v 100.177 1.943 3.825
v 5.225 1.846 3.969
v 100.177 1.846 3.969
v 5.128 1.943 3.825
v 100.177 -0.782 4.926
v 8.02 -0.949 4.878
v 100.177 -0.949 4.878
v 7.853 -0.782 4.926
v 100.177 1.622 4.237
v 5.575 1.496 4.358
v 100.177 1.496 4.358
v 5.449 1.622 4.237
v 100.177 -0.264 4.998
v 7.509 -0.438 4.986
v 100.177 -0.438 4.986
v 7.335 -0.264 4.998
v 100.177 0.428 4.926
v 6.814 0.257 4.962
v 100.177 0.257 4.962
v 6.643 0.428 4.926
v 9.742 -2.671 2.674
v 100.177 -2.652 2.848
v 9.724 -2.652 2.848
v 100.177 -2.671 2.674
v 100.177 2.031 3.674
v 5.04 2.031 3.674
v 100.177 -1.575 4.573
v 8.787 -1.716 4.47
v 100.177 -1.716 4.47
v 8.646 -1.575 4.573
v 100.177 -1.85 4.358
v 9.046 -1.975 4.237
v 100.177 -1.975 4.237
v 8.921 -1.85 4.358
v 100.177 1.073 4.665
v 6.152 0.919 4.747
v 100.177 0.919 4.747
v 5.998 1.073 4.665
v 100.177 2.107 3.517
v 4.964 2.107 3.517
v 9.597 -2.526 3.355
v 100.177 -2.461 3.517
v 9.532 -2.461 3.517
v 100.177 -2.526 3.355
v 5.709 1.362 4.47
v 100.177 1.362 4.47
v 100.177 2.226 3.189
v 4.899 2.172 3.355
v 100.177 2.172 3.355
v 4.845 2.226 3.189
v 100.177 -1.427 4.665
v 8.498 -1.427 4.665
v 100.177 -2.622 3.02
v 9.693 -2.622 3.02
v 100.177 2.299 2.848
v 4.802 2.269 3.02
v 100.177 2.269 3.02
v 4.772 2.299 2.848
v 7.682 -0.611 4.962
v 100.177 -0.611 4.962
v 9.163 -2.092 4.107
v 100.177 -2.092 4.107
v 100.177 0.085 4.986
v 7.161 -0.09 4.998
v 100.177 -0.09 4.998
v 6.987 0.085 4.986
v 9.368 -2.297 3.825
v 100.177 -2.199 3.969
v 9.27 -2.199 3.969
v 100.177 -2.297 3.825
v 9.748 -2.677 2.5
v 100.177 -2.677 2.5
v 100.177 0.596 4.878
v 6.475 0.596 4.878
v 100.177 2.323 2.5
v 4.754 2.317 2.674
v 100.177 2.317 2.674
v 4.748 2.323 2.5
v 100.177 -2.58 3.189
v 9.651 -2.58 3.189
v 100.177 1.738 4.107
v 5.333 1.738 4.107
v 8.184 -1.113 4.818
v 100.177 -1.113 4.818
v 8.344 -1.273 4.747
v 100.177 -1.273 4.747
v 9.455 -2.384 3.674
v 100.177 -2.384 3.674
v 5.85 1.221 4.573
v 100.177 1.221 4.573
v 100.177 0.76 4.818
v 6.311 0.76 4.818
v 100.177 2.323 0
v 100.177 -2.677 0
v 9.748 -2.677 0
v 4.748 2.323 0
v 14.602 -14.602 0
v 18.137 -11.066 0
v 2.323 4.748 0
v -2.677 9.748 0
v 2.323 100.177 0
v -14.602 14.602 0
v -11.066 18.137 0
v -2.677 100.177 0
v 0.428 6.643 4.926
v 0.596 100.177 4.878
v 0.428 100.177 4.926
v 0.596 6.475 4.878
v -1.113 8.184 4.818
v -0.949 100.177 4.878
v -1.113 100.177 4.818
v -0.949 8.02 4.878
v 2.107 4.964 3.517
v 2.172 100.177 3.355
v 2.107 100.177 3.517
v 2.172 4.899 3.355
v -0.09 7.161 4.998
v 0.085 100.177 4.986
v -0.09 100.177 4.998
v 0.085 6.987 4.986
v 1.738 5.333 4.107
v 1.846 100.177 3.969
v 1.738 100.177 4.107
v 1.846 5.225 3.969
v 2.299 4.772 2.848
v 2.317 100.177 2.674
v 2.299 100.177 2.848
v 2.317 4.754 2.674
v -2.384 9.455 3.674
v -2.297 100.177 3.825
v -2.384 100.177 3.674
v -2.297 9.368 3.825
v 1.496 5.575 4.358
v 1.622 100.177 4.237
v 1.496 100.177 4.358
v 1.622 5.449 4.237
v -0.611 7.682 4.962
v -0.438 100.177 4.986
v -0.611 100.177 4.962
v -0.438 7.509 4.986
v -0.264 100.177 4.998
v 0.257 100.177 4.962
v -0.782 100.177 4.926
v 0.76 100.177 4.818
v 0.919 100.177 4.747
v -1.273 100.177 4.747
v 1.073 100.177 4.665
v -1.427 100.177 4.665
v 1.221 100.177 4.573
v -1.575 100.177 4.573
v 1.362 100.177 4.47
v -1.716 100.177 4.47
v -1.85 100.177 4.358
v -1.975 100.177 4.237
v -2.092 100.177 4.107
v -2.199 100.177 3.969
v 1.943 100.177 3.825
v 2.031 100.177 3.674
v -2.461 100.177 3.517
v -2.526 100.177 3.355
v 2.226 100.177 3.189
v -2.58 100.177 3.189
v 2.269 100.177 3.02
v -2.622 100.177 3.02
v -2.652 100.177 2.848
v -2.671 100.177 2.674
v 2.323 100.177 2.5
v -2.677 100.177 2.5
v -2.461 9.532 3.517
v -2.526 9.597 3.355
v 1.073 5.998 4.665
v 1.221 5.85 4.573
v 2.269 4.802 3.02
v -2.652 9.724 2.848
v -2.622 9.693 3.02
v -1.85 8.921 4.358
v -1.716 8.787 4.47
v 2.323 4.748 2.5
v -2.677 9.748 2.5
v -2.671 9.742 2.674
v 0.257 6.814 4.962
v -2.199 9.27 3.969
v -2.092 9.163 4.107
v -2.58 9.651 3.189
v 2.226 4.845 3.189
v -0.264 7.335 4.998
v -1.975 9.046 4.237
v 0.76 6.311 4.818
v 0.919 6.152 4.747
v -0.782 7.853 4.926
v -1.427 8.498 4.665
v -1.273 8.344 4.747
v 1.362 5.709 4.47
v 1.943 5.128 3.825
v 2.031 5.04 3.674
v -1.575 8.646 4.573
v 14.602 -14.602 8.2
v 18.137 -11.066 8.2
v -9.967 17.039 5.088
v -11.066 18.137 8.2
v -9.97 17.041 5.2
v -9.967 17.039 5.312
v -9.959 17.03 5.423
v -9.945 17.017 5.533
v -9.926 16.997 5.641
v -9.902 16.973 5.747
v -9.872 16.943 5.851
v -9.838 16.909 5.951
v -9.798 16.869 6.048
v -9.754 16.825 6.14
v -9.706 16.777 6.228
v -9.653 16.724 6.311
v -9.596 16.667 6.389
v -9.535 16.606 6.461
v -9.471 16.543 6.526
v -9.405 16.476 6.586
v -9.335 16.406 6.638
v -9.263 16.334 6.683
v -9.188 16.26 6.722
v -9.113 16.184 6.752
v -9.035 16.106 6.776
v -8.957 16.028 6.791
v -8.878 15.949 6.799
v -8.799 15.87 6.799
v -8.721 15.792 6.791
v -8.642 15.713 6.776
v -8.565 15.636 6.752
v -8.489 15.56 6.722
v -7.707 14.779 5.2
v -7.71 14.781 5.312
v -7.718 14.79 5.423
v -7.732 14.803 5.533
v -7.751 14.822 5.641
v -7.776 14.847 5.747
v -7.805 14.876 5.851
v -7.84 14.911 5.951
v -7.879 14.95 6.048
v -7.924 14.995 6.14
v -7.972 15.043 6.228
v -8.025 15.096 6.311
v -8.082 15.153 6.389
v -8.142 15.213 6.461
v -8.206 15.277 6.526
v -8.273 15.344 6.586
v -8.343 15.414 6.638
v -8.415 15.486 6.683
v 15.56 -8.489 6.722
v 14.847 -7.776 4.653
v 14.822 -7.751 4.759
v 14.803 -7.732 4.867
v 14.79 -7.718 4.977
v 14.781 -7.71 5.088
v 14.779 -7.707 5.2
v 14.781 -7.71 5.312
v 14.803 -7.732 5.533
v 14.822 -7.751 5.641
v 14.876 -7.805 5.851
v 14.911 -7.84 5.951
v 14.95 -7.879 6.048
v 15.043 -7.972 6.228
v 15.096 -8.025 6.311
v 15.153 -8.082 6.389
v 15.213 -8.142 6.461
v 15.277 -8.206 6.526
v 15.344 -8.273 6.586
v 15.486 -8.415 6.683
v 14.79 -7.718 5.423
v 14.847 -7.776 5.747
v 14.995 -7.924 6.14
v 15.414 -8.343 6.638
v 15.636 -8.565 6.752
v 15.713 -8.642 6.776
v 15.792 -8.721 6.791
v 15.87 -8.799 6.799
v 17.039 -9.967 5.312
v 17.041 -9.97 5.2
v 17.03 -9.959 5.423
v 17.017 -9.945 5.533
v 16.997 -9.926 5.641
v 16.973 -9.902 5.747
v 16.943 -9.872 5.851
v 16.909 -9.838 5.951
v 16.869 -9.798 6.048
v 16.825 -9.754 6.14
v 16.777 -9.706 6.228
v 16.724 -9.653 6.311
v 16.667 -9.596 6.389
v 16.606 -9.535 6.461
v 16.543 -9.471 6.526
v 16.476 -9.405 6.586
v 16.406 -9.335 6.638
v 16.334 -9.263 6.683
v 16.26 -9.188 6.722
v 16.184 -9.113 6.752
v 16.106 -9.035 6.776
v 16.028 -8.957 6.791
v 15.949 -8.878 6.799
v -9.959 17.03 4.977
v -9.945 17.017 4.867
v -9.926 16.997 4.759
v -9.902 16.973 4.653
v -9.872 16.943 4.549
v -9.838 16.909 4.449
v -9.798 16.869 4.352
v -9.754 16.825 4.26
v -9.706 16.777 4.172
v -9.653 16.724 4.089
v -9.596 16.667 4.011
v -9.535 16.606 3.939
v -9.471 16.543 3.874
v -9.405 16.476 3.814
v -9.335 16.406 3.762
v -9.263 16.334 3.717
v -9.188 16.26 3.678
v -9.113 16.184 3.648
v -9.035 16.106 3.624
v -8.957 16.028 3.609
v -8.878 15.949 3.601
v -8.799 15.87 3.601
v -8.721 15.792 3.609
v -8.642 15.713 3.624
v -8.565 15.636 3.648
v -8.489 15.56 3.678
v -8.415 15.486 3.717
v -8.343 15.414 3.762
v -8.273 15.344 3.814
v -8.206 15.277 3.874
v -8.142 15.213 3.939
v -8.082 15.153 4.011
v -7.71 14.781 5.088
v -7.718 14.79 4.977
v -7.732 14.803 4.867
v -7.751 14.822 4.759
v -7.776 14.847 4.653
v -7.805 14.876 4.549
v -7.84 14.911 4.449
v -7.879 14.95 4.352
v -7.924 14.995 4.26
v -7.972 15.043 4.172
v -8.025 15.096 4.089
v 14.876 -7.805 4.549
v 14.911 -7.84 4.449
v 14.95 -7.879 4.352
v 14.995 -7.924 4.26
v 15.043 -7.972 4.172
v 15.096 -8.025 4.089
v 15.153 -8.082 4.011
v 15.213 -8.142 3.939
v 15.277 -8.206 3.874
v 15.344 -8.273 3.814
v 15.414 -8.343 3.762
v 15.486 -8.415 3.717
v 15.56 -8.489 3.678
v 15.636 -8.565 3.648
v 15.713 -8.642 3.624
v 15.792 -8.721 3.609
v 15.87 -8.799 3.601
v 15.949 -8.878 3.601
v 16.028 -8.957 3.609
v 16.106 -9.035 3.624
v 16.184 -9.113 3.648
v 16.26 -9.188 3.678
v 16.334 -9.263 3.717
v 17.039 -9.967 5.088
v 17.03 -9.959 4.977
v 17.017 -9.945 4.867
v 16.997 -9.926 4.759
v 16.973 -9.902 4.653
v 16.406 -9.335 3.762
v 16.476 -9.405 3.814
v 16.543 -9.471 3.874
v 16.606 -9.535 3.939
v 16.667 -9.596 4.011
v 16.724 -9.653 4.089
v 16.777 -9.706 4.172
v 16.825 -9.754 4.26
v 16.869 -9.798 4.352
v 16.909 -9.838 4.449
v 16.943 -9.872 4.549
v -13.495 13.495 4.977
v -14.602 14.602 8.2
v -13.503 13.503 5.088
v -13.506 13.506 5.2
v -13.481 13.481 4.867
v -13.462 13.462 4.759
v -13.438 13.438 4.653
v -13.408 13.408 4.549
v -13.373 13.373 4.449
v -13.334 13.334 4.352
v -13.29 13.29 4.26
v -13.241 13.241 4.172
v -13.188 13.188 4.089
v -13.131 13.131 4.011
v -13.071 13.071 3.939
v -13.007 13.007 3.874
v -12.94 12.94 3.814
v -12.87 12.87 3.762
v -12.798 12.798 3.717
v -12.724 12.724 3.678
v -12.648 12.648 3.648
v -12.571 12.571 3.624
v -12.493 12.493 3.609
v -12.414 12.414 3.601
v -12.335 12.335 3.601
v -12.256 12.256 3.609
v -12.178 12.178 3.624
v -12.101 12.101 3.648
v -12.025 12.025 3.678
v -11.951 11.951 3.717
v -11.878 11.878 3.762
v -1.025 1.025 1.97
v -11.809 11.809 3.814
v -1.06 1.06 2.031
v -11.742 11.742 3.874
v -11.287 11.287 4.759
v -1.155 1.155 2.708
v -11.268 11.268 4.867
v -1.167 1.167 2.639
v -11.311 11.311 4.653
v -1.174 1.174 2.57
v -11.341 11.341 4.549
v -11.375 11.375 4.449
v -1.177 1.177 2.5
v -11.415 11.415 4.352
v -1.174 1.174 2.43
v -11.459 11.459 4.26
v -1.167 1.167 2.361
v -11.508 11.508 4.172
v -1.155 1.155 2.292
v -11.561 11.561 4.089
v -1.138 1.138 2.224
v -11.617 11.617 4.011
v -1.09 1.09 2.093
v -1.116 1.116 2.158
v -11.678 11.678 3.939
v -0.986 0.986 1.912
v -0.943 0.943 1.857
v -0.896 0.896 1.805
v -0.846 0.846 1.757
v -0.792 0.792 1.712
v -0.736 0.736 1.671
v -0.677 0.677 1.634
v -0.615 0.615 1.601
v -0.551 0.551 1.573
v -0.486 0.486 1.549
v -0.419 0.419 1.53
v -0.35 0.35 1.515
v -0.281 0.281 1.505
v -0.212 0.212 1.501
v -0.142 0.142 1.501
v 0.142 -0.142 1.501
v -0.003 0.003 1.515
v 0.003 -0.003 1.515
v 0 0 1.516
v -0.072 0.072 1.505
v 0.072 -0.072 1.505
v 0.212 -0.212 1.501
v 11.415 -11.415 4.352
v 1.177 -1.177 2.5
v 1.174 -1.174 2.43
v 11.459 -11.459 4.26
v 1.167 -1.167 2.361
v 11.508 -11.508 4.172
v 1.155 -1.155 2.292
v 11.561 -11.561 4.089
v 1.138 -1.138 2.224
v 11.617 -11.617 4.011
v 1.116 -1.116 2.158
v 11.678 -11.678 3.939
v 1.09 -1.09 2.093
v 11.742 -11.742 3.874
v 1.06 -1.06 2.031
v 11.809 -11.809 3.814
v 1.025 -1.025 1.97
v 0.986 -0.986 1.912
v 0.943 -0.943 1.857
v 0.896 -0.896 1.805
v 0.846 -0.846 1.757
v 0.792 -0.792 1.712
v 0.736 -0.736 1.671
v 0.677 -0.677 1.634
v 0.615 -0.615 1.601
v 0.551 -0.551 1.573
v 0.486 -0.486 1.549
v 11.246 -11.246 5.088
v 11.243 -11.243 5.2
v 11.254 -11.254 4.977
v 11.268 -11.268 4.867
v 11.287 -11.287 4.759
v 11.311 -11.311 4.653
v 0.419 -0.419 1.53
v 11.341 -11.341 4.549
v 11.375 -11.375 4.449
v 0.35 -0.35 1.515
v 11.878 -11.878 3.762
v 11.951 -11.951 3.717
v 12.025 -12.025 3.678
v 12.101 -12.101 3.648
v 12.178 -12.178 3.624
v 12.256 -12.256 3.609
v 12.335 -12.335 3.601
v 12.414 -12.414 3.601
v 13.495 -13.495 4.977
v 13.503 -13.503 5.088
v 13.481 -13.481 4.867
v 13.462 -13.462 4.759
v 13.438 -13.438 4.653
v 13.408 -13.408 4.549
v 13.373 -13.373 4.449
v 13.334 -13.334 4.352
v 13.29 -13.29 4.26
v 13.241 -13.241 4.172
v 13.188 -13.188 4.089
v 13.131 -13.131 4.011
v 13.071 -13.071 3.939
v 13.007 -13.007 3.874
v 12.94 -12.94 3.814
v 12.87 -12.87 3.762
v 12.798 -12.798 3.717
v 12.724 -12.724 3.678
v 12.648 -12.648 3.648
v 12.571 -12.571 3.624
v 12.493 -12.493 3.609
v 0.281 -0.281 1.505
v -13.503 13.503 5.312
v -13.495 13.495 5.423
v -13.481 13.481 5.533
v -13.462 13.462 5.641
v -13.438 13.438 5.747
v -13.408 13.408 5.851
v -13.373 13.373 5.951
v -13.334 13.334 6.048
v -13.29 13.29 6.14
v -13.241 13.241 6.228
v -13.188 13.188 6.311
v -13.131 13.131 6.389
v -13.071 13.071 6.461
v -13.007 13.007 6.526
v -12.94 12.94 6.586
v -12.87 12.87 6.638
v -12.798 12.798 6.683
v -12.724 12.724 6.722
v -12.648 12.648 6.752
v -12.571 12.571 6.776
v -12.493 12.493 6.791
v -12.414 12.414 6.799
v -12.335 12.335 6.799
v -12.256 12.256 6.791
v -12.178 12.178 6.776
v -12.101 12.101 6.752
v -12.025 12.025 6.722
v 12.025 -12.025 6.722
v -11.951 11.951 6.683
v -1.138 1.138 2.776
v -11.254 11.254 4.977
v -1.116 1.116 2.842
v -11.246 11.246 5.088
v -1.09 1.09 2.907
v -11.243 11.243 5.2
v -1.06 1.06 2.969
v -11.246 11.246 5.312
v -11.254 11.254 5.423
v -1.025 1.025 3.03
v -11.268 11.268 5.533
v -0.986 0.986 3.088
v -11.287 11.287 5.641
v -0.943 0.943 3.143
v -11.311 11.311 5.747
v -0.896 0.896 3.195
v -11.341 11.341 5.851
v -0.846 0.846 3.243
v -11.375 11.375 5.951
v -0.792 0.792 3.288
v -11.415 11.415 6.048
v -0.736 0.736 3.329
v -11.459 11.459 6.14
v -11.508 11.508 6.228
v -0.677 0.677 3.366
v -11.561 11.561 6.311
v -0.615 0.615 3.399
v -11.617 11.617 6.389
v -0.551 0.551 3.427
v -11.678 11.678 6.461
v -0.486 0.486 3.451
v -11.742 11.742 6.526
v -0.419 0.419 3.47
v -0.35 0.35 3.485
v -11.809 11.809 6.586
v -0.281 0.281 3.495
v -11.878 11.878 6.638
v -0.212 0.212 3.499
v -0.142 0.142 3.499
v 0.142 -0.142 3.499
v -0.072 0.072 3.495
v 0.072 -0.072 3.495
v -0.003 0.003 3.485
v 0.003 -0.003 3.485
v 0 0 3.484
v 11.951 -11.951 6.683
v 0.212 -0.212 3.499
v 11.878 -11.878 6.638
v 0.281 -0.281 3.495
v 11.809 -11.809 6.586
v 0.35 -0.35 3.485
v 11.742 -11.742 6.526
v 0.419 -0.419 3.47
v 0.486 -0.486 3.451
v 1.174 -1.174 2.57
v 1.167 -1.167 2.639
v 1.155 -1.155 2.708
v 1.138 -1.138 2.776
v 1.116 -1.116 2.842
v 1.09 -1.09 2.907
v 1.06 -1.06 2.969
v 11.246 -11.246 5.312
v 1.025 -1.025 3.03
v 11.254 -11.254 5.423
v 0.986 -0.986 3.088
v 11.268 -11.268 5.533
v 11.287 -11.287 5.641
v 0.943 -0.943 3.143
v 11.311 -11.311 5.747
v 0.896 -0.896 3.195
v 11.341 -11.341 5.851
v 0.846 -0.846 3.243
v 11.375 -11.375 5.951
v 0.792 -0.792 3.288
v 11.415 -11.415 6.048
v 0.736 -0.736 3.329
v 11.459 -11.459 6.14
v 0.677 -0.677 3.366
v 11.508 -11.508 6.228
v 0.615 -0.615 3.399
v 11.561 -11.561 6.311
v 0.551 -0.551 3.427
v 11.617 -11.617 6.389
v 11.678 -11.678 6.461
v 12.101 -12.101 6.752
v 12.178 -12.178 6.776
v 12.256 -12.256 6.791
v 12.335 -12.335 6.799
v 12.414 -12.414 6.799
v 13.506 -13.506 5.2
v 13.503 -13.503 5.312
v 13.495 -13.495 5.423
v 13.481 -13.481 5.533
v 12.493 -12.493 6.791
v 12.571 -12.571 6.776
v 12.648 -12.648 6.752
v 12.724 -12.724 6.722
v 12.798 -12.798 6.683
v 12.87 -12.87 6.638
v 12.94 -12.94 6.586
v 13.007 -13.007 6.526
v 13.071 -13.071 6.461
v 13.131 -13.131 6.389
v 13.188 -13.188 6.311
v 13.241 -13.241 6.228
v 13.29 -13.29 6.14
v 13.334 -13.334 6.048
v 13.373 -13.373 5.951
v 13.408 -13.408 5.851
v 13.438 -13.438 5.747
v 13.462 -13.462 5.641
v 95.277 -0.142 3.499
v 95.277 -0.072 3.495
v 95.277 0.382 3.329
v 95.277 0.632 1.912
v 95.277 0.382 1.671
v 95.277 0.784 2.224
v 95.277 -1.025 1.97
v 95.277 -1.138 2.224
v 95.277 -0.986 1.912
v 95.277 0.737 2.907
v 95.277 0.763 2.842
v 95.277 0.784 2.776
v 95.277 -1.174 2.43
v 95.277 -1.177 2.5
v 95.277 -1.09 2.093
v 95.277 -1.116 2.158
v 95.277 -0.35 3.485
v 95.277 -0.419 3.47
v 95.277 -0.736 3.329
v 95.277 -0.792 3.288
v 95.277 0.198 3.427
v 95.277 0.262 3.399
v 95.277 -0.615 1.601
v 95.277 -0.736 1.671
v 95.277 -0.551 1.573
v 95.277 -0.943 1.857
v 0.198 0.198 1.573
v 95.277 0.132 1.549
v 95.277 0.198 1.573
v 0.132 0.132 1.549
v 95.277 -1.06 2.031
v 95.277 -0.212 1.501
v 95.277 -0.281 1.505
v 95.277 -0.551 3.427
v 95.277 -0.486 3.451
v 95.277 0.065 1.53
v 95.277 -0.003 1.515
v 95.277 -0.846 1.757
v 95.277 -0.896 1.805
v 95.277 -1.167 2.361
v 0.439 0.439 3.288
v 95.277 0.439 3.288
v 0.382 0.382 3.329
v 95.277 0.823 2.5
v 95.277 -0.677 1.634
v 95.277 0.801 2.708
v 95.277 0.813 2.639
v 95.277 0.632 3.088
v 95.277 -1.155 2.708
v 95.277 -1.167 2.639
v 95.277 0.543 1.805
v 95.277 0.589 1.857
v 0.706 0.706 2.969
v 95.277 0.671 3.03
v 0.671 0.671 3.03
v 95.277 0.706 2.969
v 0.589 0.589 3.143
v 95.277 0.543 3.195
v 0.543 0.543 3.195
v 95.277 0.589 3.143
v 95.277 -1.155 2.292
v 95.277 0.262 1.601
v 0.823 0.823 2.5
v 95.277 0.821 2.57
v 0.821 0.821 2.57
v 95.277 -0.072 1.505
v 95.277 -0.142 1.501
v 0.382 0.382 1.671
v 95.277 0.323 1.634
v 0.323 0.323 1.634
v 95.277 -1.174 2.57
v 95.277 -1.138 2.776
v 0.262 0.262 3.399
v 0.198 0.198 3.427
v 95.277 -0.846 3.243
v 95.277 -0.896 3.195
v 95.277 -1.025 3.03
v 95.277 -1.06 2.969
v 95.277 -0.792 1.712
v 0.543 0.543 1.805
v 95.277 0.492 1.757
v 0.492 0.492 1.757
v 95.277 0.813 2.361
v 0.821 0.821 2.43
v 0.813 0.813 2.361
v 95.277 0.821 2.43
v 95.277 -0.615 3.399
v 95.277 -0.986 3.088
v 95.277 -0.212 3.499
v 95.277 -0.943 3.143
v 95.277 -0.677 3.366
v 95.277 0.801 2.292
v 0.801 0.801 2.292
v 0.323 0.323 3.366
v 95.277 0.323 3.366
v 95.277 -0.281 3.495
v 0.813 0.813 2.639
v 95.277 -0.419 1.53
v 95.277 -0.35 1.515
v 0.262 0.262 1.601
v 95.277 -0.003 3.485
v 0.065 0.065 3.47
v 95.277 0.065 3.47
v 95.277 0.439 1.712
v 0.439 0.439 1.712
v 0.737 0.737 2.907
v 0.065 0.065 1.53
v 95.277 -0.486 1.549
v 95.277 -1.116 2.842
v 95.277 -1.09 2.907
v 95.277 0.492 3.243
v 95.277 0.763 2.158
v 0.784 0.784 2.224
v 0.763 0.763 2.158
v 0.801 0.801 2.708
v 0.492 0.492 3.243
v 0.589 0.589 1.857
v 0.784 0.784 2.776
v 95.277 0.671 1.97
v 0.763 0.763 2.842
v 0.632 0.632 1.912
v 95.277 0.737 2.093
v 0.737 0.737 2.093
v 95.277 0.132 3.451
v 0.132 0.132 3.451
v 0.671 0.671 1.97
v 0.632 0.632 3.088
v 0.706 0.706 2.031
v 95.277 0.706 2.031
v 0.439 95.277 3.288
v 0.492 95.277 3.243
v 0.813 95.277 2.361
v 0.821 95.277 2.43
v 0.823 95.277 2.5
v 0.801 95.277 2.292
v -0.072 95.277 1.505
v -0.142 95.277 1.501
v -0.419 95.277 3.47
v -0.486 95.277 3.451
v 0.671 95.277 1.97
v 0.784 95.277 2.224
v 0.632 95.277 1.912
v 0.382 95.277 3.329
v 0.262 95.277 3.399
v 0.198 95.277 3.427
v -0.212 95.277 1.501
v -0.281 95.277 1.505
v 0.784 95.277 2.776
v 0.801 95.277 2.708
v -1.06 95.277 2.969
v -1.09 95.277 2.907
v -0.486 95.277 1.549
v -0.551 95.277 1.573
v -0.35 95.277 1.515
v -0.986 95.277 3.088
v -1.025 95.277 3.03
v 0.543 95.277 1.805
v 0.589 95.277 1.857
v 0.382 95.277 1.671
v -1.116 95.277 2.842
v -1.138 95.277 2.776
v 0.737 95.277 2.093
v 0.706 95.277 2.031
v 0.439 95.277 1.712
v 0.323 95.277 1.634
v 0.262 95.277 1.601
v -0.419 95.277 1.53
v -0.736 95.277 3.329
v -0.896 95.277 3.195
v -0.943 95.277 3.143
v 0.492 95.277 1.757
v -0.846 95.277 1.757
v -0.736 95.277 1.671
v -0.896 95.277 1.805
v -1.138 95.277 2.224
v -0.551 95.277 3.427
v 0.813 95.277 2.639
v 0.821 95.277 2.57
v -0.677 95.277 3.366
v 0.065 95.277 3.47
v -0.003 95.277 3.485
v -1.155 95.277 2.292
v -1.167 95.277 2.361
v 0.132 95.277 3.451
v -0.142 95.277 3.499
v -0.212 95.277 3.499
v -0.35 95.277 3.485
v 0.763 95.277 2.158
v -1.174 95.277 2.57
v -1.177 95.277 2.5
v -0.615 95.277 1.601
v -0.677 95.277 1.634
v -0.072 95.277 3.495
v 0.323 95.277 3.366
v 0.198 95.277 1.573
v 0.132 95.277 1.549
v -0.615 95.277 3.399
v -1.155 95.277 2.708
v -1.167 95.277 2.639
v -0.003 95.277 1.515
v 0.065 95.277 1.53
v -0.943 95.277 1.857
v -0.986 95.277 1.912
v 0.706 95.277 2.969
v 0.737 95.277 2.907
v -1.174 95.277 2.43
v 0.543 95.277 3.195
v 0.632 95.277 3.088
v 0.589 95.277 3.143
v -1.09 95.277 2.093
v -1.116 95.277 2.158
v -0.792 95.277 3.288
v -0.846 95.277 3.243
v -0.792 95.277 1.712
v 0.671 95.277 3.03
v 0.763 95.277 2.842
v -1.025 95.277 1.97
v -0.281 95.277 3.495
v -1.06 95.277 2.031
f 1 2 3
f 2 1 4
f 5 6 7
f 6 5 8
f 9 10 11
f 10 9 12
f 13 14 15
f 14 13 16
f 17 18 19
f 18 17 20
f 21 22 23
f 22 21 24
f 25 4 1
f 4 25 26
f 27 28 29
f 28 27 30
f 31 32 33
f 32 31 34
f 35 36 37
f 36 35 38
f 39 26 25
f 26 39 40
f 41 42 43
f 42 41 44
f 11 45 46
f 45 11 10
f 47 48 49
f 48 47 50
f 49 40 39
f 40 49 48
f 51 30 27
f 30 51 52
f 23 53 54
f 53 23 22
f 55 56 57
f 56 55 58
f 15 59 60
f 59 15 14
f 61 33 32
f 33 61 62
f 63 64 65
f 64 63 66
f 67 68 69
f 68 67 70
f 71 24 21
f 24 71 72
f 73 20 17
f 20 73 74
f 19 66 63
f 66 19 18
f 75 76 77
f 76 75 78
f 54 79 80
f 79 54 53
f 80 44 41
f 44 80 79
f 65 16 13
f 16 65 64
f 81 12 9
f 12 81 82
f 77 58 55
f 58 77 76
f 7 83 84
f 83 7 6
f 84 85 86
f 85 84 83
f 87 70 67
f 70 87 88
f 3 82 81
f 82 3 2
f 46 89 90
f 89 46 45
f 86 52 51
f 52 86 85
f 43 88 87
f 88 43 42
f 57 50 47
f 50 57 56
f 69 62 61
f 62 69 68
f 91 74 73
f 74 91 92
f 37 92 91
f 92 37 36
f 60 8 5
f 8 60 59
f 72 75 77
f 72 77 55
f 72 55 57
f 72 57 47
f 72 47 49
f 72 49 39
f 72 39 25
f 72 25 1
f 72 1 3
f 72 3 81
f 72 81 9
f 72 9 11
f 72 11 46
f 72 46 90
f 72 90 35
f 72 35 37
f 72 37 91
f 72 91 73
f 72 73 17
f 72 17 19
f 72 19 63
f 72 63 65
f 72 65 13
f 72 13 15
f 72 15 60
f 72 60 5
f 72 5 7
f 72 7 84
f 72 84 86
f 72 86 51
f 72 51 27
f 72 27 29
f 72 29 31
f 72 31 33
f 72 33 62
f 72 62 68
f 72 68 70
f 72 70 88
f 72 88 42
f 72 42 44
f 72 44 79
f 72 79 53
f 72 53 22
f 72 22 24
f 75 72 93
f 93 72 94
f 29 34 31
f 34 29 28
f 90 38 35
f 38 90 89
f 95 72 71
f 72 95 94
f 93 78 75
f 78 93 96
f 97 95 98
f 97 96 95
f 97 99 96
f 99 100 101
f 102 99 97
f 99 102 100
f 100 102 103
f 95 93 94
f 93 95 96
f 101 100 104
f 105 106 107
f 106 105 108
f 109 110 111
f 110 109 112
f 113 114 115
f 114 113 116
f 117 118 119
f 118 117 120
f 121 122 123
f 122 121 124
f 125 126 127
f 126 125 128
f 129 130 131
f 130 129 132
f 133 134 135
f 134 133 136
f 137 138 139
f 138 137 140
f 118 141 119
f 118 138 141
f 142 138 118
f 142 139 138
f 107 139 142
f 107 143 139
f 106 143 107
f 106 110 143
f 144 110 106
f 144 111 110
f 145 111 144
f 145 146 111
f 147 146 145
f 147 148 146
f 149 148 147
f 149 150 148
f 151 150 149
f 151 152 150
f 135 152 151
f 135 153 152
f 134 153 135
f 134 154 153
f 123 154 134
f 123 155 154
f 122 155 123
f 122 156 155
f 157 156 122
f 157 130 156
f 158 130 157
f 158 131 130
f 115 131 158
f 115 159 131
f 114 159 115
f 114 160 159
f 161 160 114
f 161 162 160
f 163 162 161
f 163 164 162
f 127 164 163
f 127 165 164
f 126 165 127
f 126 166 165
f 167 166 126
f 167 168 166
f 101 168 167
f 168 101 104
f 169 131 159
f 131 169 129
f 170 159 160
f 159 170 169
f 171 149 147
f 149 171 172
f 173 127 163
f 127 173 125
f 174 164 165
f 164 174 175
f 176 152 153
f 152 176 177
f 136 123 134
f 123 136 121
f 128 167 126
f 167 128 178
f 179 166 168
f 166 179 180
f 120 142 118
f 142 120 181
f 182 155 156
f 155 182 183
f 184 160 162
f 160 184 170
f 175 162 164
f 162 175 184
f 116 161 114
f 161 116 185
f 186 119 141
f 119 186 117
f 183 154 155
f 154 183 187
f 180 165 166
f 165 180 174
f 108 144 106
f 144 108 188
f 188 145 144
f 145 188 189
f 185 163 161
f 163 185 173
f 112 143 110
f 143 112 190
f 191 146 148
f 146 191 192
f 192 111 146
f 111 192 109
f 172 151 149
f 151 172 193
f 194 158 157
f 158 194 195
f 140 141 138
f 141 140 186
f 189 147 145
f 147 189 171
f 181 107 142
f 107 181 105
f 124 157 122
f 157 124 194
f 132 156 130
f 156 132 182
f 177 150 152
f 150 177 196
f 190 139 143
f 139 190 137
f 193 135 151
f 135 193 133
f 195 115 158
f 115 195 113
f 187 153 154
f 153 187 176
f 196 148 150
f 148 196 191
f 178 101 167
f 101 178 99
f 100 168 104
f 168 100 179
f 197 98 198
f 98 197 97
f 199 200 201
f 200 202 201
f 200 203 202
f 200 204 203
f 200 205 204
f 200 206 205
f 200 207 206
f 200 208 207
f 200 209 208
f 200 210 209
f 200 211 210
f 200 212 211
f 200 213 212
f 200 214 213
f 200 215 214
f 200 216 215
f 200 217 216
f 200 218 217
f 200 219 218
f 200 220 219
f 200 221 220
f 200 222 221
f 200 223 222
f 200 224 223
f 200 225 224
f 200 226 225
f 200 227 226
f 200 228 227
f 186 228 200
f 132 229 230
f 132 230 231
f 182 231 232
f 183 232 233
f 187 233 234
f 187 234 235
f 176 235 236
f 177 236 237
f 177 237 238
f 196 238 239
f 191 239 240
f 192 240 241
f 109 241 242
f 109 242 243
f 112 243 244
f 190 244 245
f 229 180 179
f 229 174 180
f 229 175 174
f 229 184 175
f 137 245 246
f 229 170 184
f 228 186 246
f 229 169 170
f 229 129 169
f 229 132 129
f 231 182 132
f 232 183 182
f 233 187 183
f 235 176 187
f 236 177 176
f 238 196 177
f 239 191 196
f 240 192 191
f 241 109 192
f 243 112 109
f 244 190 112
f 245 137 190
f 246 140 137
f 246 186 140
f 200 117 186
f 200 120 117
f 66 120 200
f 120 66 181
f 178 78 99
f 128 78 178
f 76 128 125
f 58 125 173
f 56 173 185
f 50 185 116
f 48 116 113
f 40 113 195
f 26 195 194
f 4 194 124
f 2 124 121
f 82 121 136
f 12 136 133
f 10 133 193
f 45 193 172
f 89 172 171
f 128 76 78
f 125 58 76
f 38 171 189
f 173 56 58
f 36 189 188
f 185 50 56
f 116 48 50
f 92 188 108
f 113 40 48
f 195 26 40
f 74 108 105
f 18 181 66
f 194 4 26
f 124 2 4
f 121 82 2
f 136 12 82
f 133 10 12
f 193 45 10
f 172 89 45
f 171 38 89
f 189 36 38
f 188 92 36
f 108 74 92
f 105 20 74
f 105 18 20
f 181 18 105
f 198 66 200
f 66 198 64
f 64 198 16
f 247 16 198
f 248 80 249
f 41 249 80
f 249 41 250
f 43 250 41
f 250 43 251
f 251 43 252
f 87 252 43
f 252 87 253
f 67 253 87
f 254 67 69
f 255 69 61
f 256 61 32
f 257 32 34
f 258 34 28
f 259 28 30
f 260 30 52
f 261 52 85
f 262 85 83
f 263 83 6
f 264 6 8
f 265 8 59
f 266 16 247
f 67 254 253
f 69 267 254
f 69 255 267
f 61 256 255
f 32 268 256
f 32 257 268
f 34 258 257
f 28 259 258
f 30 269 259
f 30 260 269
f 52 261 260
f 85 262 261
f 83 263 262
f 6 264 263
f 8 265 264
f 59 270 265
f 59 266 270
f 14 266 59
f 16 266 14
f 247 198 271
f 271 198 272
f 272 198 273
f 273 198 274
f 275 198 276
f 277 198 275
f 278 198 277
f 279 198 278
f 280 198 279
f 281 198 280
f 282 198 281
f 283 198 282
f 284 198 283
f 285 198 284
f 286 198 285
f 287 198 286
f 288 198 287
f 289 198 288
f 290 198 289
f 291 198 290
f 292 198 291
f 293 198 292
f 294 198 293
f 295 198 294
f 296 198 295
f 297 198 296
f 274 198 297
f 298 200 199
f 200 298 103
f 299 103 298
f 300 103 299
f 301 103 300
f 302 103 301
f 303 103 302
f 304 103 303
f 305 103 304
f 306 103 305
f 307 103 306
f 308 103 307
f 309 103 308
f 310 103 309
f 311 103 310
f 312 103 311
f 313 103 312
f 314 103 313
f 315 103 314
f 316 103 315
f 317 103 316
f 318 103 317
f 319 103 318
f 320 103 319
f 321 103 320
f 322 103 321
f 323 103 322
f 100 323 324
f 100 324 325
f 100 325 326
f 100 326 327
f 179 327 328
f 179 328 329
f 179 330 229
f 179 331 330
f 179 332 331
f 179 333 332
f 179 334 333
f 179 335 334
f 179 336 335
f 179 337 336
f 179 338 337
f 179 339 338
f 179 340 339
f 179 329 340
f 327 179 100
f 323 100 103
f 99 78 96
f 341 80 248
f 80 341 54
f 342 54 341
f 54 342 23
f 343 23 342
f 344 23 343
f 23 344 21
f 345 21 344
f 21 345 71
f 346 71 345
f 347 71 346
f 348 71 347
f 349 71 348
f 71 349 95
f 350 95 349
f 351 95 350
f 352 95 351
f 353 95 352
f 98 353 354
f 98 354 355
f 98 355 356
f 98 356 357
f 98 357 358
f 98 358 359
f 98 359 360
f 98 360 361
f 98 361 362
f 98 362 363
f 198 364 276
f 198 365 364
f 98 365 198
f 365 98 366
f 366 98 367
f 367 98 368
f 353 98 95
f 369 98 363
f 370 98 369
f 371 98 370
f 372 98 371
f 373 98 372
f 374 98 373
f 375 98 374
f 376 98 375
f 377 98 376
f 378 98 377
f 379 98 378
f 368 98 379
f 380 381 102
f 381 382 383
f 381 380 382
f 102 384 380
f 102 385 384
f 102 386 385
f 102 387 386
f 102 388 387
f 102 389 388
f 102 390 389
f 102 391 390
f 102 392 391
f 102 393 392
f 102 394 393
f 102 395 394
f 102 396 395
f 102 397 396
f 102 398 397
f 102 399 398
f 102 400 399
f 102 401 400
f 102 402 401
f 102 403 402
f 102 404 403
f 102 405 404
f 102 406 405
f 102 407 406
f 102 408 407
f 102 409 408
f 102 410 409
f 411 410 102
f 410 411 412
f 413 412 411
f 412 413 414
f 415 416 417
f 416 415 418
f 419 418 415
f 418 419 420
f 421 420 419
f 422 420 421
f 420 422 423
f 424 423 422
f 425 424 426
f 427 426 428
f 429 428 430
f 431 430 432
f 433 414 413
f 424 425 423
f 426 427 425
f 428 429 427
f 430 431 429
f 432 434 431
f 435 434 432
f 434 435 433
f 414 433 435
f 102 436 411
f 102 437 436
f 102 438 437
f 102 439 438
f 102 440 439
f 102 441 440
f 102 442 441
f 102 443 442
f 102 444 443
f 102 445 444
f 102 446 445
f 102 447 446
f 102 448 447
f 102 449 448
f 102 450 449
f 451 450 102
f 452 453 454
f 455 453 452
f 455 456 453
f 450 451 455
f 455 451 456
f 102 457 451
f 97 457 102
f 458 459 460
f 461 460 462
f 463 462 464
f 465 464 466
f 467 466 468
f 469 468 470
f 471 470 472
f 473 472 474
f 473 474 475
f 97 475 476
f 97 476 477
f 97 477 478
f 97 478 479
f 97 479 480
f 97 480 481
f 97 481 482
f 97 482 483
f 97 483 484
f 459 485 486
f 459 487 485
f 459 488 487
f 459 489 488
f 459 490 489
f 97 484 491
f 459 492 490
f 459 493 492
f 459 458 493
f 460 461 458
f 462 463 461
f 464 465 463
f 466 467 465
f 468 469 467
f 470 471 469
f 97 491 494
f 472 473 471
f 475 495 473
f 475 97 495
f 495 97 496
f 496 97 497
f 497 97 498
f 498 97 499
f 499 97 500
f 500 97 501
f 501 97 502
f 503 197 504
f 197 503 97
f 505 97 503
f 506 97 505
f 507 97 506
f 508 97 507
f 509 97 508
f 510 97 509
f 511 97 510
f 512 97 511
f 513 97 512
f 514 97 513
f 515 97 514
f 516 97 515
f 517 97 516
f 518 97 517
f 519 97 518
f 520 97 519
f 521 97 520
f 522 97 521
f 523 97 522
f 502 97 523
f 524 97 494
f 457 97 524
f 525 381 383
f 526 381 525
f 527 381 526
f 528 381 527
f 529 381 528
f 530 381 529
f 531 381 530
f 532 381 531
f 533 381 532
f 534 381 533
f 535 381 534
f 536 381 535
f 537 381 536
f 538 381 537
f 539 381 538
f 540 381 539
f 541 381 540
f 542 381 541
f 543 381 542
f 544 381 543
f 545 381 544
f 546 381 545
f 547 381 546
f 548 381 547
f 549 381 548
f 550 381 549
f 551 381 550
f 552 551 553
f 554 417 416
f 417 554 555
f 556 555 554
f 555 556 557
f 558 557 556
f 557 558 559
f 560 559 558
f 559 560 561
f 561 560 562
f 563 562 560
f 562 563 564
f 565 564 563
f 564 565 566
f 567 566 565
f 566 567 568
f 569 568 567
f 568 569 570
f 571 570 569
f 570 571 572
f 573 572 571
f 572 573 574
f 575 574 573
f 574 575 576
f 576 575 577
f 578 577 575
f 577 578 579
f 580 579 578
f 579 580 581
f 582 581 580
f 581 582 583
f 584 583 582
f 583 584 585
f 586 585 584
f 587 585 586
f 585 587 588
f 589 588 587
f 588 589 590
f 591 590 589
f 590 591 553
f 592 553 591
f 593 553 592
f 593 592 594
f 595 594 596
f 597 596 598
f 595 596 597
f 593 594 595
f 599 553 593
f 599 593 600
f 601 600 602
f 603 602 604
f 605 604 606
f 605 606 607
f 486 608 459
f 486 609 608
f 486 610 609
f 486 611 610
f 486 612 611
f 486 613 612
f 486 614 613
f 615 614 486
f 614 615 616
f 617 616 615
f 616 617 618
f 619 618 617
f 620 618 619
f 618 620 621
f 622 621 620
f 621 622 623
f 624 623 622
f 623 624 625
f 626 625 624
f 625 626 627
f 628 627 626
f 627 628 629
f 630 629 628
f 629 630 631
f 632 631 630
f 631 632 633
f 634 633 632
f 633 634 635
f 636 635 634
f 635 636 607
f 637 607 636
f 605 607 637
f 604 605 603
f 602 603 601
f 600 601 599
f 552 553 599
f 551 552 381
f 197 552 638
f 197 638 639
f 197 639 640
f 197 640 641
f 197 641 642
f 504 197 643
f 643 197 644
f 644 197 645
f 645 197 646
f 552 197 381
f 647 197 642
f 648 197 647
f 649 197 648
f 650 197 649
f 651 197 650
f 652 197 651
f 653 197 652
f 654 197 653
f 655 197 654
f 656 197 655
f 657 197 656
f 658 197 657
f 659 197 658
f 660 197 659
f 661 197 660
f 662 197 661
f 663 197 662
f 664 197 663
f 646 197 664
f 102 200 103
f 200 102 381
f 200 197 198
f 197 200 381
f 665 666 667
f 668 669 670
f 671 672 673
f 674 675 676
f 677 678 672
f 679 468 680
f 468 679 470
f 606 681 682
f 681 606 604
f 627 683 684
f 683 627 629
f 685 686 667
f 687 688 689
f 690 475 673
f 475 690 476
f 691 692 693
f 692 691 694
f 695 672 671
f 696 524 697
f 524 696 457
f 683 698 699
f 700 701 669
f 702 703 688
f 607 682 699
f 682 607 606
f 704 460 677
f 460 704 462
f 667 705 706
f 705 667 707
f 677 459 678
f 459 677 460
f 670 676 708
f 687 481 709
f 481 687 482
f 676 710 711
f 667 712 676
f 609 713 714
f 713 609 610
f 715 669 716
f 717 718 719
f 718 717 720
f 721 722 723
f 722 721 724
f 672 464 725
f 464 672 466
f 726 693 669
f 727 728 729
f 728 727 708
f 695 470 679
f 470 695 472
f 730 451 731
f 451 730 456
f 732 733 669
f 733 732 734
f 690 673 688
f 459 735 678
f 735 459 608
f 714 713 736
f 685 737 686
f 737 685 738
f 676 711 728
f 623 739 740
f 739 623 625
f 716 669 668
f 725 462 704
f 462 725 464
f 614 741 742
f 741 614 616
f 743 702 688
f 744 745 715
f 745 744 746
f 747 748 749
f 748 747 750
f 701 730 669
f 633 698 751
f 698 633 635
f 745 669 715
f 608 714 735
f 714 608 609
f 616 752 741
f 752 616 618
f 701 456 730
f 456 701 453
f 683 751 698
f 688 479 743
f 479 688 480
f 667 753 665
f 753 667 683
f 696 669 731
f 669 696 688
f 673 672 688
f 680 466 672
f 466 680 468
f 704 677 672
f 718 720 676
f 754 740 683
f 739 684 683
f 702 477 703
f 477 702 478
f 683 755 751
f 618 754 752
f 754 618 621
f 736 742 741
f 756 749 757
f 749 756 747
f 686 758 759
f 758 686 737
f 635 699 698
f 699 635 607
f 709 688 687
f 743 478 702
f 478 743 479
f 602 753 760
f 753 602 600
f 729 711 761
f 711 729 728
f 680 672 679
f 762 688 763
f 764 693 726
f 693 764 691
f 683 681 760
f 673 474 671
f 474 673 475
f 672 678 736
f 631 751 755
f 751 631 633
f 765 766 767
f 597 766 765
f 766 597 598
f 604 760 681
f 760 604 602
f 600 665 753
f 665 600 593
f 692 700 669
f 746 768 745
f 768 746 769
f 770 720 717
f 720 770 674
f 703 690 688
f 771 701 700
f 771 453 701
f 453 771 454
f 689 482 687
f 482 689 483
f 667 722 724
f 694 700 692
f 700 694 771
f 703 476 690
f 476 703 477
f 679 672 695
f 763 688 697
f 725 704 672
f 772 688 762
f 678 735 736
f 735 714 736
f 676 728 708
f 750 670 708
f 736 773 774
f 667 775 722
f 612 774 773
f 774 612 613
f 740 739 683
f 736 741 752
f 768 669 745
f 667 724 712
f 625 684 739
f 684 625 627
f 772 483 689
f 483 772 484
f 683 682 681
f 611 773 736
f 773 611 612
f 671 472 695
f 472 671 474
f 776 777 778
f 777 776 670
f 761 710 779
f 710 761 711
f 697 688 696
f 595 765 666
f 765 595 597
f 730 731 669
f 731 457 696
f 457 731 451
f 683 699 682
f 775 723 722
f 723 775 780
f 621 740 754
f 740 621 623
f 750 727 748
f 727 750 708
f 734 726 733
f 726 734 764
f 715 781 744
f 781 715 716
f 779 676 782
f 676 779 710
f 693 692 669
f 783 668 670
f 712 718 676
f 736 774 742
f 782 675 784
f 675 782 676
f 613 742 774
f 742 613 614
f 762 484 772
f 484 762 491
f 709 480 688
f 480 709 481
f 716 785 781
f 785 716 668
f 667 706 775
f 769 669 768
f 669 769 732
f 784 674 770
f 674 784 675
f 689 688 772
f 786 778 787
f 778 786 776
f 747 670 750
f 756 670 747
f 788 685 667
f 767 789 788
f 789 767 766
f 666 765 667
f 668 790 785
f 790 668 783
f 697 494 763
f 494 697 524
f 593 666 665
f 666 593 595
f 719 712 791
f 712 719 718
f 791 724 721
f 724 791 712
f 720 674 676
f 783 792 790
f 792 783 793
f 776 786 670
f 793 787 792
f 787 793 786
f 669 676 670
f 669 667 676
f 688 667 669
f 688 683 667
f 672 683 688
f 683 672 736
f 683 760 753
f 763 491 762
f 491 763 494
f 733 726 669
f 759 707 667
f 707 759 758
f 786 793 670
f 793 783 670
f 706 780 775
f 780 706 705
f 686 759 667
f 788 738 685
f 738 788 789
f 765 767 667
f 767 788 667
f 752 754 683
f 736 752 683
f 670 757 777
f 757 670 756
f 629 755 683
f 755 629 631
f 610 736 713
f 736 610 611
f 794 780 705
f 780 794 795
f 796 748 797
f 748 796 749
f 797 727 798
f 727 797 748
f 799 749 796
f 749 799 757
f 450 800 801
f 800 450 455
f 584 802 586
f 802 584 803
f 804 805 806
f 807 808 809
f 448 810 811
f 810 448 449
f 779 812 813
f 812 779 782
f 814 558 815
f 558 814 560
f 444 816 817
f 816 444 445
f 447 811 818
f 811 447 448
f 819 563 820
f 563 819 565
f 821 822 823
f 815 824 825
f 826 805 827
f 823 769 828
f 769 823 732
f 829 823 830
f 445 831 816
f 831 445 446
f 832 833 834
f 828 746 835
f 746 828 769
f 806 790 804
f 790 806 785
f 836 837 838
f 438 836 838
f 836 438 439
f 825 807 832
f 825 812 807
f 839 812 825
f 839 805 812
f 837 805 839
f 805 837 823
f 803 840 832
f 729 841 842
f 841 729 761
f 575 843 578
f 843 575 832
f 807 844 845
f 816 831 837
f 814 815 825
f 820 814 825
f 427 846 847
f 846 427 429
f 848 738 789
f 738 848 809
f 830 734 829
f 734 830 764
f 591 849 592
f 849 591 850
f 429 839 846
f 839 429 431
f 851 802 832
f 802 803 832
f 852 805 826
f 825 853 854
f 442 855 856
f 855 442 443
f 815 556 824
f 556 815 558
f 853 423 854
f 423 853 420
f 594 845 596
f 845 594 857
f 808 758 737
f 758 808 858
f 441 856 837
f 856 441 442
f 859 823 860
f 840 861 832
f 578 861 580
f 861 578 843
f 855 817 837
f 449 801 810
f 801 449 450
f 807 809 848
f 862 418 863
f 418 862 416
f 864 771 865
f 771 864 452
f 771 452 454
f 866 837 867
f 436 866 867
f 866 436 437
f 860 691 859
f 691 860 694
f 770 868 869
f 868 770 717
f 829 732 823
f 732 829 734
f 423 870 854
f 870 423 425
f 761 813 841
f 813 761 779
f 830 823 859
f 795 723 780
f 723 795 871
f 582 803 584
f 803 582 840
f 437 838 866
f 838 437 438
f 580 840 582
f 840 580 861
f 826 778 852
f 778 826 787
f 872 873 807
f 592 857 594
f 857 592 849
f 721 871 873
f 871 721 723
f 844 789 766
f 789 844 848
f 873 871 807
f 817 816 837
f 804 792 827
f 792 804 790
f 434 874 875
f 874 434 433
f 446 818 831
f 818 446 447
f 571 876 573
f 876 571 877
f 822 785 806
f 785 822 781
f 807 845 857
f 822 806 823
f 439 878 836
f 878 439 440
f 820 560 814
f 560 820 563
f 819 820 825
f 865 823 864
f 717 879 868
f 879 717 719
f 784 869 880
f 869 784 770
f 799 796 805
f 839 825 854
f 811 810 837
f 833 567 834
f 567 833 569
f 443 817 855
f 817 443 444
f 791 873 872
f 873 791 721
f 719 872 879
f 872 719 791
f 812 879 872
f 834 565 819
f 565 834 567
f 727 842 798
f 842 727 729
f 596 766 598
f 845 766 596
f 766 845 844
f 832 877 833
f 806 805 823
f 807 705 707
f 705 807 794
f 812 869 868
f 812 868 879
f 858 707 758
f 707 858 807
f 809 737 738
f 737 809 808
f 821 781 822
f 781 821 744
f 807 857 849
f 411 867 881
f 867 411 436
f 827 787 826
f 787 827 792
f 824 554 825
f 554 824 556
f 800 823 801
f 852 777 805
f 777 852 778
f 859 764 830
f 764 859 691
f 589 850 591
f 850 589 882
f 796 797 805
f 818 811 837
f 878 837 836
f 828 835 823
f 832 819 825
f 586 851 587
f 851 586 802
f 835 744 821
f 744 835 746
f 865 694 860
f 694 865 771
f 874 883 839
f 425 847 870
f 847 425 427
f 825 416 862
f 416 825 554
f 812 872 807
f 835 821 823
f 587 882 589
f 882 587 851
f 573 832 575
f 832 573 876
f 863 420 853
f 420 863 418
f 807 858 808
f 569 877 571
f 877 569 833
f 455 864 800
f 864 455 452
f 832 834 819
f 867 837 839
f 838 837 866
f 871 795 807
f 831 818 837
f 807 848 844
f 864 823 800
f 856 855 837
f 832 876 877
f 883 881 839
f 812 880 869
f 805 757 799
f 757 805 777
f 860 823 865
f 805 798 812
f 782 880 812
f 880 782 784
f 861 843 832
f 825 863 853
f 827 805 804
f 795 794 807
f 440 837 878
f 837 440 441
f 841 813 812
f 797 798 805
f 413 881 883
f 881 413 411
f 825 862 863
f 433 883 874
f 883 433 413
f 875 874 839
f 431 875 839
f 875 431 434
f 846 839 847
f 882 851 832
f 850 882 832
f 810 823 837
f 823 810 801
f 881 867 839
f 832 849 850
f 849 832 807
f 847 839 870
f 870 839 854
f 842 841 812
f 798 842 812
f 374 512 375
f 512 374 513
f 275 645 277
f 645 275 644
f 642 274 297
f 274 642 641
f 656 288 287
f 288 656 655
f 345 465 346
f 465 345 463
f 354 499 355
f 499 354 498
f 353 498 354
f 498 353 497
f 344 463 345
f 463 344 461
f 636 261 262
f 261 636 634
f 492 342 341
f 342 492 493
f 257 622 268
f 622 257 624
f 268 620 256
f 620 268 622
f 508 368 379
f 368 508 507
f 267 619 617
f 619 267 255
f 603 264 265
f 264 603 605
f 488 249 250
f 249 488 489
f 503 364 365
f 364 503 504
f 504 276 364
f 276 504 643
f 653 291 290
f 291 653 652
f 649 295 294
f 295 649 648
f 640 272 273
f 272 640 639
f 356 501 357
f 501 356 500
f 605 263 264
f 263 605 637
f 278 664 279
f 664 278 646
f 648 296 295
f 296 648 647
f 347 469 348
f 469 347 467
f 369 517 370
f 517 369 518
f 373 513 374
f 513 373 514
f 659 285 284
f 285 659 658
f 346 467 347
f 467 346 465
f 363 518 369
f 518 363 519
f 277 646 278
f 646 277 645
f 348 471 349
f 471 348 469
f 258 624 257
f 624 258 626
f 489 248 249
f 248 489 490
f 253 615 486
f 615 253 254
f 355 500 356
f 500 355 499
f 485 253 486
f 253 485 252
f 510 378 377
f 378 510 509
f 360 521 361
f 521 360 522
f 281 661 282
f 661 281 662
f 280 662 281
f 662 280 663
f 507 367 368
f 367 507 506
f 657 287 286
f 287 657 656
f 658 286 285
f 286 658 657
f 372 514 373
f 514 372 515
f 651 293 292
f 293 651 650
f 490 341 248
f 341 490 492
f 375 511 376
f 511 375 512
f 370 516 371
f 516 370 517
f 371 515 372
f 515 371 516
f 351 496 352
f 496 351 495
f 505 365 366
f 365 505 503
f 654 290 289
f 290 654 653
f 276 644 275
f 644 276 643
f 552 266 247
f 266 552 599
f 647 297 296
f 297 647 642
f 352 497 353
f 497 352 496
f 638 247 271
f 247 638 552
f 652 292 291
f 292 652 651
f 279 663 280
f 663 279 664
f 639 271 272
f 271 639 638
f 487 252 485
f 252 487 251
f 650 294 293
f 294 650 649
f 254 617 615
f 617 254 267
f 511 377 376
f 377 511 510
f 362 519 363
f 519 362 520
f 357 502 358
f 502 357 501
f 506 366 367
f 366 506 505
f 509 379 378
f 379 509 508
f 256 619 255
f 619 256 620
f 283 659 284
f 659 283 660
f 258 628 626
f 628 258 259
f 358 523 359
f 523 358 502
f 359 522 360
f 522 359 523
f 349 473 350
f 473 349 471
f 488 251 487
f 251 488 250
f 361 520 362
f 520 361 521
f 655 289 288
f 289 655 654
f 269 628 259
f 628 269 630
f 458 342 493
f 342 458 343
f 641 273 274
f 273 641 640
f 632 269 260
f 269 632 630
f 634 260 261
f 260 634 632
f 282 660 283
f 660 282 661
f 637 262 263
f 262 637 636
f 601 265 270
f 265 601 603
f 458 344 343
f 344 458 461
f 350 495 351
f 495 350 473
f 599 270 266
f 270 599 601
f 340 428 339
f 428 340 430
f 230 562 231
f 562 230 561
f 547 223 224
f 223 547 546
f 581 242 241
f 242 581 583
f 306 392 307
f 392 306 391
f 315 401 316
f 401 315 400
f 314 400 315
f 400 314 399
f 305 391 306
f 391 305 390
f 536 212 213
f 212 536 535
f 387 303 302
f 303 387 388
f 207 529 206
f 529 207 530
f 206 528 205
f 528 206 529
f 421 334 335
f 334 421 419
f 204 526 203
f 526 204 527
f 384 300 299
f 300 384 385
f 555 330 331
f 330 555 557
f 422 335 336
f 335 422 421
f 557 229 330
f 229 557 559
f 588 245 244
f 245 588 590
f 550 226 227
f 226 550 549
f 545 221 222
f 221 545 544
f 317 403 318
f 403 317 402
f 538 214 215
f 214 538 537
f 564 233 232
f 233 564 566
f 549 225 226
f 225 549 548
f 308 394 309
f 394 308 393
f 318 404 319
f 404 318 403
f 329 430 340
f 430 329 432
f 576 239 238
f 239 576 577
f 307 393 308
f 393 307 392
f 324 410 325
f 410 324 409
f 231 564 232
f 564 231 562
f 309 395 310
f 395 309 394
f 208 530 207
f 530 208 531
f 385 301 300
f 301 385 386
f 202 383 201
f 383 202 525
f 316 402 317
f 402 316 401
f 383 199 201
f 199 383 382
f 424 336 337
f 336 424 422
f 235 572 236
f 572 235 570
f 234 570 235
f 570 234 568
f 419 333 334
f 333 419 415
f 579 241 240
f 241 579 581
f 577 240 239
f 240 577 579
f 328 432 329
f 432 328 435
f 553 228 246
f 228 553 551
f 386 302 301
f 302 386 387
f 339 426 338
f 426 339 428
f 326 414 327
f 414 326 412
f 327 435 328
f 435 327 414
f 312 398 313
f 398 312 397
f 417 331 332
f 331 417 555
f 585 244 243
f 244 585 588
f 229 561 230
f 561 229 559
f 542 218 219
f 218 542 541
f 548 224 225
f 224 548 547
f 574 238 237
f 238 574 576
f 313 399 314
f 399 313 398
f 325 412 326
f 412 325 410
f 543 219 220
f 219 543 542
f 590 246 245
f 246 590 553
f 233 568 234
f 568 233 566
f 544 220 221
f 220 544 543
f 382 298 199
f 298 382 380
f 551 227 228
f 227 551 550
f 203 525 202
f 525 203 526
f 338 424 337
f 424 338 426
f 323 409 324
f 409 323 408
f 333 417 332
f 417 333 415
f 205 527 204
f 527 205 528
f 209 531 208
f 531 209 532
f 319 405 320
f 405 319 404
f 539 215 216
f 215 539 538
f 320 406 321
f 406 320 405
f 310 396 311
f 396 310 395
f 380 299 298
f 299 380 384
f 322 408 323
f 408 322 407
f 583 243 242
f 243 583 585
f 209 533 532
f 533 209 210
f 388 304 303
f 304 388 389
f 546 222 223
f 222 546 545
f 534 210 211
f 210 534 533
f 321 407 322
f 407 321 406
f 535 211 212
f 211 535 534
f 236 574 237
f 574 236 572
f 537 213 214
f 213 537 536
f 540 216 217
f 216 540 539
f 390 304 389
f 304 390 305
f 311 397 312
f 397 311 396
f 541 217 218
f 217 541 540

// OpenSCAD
$fn = 90*1;

EPS = 0.1*1;

// Inner diameter of antenna tubes
DIA_ANT_TUBE = 2; // [1:5]
DIA_ANT_OUTER_TUBE = DIA_ANT_TUBE + 3;

// Length of tubes (the last 5 mm will be solid, so make this your antenna length +5)
TUBE_LEN = 100; // [20:200]
TUBE_CTR_OFFS = 0.25*1;

// Diameter of mounting holes
DIA_MOUNT_HOLES = 3.1; // [2:4]

// Mounting holes distance 
WIDTH_MOUNT_HOLES = 35; // [20:60]

// Width of the base
BASE_WIDTH = DIA_ANT_OUTER_TUBE + DIA_MOUNT_HOLES + 0.1; 

BASE_LENGTH = WIDTH_MOUNT_HOLES + 2 * DIA_MOUNT_HOLES + 0.1;
BASE_HEIGHT = 5*1;

rotate([-90, 0, -45]) 
difference() {
	union() {
		// base
		translate([-BASE_LENGTH/2, -BASE_WIDTH, 0])
			cube ([BASE_LENGTH, BASE_WIDTH, BASE_HEIGHT]);
		// tubes
		translate([TUBE_CTR_OFFS, -DIA_ANT_OUTER_TUBE/2, 0])
			rotate([0, 45, 0]) {
				cylinder(d = DIA_ANT_OUTER_TUBE, h = TUBE_LEN);
				translate([-DIA_ANT_OUTER_TUBE/2, 0, 0])
					cube([DIA_ANT_OUTER_TUBE, DIA_ANT_OUTER_TUBE/2, TUBE_LEN]);
			}
		translate([-TUBE_CTR_OFFS, -DIA_ANT_OUTER_TUBE/2, 0])
			rotate([0, -45, 0]) {
				cylinder(d = DIA_ANT_OUTER_TUBE, h = TUBE_LEN);
				translate([-DIA_ANT_OUTER_TUBE/2, 0, 0])
					cube([DIA_ANT_OUTER_TUBE, DIA_ANT_OUTER_TUBE/2, TUBE_LEN]);
			}
	}
	// hollow tubes
	translate([TUBE_CTR_OFFS, -DIA_ANT_OUTER_TUBE/2, 0])
		rotate([0, 45, 0])
			translate([0, 0, -10 - EPS])
					cylinder(d = DIA_ANT_TUBE, h = TUBE_LEN + 10 + 2 * EPS - 5);
	translate([-TUBE_CTR_OFFS, -DIA_ANT_OUTER_TUBE/2, 0])
		rotate([0, -45, 0])
			translate([0, 0, -10 - EPS])
					cylinder(d = DIA_ANT_TUBE, h = TUBE_LEN + 10 + 2 * EPS - 5);
	// cut below base
	translate([-BASE_LENGTH/2 - EPS, -BASE_WIDTH - EPS, -5]) cube ([BASE_LENGTH + 2*EPS, BASE_WIDTH + 2*EPS, 5]);
	// mounting holes
	translate([WIDTH_MOUNT_HOLES/2, -BASE_WIDTH + 3, - EPS])
		cylinder(d = DIA_MOUNT_HOLES + 0.1, h = BASE_HEIGHT + 2*EPS);
	translate([-WIDTH_MOUNT_HOLES/2, -BASE_WIDTH + 3, - EPS])
		cylinder(d = DIA_MOUNT_HOLES + 0.1, h = BASE_HEIGHT + 2*EPS);
}
